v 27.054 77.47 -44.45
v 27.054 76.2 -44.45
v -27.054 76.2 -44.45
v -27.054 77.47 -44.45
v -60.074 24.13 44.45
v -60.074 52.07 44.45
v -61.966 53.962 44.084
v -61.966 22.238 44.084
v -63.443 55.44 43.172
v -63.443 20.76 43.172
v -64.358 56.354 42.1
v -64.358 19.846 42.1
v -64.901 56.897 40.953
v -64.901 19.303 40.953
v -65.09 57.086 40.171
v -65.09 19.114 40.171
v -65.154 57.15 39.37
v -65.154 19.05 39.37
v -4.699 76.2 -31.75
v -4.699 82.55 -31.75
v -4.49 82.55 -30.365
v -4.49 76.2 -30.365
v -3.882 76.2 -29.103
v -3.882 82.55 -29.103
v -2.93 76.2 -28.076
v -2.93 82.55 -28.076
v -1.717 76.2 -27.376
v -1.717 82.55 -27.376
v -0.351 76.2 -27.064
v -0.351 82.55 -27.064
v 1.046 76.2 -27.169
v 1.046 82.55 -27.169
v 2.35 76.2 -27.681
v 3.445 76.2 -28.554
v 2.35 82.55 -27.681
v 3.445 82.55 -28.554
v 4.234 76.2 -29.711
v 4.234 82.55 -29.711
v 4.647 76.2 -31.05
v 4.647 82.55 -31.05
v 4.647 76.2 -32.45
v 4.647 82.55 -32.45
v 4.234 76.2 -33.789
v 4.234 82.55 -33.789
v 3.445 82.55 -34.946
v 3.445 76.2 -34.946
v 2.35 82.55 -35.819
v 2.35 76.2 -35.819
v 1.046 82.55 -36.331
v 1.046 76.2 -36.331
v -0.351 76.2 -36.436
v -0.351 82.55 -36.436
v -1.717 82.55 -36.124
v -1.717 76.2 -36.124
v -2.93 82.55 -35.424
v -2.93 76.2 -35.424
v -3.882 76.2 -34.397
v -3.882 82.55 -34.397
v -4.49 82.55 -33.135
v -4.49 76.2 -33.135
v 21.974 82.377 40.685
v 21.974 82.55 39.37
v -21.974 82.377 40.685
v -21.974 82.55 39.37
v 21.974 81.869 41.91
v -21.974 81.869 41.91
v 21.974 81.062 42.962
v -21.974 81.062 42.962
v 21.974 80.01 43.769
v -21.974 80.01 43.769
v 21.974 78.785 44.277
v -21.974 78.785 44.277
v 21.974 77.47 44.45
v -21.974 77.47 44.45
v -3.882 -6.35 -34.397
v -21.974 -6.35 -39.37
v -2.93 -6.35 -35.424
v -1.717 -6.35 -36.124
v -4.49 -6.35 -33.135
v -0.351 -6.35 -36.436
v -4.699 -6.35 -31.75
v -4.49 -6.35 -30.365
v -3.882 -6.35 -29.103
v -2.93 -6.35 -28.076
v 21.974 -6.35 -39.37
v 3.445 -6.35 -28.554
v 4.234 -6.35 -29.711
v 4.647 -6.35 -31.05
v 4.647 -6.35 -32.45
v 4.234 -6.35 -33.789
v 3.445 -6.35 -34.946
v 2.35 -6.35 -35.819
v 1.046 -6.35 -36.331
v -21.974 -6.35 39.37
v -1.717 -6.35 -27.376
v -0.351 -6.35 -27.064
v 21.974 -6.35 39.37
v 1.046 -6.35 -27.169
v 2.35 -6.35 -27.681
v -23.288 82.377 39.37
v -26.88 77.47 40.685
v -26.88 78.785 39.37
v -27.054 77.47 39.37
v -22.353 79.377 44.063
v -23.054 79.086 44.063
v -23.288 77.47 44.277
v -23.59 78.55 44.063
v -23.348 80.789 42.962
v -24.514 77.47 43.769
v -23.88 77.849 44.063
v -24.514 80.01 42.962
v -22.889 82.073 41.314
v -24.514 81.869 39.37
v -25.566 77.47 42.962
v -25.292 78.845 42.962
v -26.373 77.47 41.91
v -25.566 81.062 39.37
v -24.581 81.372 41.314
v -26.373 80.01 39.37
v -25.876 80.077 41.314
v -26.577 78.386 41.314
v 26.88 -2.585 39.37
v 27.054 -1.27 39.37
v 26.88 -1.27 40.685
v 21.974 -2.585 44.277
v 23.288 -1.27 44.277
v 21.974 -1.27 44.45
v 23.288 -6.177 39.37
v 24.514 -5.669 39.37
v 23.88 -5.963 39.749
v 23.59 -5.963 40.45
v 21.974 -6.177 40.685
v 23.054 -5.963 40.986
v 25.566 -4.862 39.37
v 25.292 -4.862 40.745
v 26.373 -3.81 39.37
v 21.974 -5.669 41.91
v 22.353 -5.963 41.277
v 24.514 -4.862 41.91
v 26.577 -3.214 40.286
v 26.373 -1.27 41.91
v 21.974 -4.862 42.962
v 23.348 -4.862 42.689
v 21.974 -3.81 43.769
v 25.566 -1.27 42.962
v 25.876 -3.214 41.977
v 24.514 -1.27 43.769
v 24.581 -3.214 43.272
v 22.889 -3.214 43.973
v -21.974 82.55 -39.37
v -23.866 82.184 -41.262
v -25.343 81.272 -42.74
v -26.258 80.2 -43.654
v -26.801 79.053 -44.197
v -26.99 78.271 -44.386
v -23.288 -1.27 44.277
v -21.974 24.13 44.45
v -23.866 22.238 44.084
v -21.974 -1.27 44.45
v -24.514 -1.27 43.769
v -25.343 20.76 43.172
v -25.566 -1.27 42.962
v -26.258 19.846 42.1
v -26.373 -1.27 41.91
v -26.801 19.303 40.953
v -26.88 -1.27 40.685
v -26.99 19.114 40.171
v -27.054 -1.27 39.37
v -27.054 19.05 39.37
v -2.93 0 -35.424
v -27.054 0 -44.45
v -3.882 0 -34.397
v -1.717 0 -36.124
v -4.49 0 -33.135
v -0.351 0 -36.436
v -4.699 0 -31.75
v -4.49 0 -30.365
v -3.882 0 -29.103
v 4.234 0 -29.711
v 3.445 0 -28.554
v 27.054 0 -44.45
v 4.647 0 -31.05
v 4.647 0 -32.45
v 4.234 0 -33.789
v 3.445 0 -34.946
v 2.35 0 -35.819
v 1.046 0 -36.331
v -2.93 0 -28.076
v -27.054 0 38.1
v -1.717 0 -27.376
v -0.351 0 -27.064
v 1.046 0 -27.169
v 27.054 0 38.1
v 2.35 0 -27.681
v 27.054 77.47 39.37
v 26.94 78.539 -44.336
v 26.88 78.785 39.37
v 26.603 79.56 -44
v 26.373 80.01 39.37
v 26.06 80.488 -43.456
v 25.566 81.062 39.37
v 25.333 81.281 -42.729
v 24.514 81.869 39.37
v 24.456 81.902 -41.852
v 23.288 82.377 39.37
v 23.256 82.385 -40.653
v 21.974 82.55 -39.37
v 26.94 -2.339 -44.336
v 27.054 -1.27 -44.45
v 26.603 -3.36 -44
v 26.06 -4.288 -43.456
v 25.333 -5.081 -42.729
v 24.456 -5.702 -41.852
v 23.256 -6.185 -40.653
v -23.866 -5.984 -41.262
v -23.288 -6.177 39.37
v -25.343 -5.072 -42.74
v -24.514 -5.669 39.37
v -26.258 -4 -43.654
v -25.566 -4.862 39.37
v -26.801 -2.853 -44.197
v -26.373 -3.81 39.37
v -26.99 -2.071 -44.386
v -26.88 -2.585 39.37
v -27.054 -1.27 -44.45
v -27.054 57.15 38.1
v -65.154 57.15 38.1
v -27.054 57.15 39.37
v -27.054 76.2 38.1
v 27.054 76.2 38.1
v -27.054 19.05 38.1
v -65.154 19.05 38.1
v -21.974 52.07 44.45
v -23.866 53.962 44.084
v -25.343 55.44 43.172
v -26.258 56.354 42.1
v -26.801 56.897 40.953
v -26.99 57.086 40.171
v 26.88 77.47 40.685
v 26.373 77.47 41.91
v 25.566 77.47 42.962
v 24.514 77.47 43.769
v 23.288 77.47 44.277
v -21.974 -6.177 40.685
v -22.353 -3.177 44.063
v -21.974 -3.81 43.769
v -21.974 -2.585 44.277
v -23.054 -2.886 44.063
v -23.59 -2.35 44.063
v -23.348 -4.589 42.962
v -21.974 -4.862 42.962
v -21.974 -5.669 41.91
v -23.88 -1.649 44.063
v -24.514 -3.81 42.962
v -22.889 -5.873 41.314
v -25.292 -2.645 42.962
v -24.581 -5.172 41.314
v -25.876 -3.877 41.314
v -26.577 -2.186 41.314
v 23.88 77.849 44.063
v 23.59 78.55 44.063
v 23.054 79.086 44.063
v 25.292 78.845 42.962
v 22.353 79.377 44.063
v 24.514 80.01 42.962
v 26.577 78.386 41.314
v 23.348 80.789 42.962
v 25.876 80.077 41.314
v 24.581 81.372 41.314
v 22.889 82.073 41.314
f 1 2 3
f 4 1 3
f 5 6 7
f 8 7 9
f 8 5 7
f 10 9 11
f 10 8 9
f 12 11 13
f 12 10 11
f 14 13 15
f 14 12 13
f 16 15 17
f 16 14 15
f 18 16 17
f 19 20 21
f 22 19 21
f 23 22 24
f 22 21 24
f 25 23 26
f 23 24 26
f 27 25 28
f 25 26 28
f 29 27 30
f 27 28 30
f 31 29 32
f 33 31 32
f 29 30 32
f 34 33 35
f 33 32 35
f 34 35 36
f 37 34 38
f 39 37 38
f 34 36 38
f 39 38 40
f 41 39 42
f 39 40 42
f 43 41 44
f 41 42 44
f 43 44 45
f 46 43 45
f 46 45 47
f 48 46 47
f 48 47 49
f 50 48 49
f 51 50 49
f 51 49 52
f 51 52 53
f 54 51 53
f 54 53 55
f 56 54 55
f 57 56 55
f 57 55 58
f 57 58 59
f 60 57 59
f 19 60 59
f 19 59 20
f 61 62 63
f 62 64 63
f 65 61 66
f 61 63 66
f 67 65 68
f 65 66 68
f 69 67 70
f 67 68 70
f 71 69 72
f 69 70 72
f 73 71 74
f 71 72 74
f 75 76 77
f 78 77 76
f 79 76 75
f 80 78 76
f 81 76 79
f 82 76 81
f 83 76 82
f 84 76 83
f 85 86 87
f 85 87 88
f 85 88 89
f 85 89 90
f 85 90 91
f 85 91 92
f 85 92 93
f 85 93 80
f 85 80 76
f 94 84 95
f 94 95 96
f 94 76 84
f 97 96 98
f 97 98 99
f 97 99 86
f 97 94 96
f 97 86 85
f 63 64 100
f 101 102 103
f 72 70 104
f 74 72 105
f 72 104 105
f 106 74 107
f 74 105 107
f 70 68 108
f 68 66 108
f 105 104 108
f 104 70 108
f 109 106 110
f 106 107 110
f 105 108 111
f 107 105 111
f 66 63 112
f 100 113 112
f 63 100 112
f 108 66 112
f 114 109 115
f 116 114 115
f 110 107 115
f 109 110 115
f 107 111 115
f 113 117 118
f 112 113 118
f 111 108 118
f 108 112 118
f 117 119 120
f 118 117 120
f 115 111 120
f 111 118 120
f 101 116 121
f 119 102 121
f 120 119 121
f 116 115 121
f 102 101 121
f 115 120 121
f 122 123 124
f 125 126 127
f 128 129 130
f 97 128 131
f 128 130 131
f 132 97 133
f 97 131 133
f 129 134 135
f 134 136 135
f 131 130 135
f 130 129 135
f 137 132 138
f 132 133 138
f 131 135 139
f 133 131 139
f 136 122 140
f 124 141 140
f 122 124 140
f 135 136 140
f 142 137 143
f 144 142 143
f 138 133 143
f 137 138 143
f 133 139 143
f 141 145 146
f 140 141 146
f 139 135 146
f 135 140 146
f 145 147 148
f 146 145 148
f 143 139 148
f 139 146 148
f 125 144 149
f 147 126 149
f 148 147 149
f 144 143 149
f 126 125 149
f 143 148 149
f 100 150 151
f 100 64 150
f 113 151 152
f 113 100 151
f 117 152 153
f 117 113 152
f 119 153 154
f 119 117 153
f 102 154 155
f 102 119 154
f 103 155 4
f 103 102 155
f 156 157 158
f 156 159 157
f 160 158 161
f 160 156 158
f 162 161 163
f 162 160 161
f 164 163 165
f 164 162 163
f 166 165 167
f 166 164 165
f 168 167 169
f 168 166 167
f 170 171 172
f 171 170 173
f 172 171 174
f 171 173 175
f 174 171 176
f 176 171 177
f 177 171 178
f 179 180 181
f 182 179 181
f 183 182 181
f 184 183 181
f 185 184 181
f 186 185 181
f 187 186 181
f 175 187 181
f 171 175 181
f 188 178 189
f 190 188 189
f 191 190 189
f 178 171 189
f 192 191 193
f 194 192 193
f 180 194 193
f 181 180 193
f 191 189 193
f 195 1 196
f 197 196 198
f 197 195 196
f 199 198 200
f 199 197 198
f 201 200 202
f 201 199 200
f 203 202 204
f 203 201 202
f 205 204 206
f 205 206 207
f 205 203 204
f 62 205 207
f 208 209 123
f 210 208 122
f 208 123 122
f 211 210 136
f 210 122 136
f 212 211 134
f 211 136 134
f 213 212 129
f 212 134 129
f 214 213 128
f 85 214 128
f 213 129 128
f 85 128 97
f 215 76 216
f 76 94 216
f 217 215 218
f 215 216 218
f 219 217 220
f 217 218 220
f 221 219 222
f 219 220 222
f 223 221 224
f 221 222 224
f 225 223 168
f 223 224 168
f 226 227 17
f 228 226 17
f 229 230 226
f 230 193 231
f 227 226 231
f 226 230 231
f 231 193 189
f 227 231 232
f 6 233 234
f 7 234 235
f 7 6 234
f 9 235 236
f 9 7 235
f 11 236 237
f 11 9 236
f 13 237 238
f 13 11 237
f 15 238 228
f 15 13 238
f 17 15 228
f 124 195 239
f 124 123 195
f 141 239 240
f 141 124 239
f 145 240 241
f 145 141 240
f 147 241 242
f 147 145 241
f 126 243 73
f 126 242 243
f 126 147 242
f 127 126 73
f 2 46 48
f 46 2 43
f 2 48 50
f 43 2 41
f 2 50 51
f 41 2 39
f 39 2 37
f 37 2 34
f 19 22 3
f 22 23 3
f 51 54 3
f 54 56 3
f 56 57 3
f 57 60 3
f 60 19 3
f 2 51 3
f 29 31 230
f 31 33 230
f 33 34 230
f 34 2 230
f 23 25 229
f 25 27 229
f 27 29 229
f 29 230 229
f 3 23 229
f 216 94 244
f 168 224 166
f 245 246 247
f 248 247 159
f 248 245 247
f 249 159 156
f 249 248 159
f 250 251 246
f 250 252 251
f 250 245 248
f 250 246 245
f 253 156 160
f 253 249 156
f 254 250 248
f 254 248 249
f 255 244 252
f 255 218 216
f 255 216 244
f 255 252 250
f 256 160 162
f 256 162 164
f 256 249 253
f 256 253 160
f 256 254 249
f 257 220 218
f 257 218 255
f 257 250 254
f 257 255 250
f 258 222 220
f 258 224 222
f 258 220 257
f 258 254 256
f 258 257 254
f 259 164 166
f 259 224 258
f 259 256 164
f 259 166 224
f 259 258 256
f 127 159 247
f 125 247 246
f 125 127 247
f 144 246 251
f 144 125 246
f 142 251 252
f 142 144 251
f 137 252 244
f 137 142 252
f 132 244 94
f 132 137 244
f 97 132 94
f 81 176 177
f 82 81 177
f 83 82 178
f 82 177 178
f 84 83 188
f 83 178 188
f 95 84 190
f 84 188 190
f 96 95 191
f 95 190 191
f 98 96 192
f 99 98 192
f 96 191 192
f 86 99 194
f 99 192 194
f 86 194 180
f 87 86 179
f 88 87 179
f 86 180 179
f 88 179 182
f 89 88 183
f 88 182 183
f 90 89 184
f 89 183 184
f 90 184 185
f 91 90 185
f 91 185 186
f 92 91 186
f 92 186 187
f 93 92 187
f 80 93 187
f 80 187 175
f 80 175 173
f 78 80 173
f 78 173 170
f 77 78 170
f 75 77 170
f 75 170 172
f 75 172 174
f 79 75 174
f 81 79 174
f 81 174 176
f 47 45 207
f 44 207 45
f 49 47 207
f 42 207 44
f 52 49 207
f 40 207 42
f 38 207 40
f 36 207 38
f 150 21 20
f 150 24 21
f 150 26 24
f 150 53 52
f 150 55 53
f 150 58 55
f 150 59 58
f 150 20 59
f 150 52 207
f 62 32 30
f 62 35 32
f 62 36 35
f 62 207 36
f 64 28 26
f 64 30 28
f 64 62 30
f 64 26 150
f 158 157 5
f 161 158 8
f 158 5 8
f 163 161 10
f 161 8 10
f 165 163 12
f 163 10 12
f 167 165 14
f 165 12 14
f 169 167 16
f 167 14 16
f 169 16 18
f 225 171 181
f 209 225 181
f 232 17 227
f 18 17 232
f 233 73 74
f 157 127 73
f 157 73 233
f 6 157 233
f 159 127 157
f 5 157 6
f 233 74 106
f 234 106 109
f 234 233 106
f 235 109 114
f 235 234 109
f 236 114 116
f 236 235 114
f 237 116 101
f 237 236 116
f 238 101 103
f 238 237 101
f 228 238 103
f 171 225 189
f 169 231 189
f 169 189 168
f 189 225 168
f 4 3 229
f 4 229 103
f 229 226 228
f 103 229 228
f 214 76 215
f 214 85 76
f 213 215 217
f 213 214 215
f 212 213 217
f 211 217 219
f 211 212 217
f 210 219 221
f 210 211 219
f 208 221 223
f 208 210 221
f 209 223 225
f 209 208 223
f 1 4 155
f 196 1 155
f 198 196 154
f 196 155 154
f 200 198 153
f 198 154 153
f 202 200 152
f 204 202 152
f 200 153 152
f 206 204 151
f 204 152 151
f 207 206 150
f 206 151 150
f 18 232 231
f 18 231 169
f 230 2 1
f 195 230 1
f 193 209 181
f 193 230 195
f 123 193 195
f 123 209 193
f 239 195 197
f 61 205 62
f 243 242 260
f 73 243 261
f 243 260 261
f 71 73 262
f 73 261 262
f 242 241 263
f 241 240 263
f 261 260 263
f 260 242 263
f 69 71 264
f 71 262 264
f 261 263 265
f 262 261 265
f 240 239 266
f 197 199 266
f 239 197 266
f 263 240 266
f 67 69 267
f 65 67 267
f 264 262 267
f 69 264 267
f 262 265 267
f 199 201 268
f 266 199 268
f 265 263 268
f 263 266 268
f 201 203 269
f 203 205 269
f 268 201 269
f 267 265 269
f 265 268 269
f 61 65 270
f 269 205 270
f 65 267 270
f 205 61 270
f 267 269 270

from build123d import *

# Parameters (mm, degrees)
F0_W     = 54.107094341
F0_H     = 88.9
F1_DEPTH = 6.35
F2_W     = 54.107094341
F2_H     = 6.35
F3_DEPTH = 76.2
F4_W     = 54.107094341
F4_H     = 88.9
F5_DEPTH = 6.35
F6_R     = 4.699
F7_DEPTH = 109.22
F8_W     = 38.1
F8_H     = 6.35
F9_DEPTH = 38.1
F10_R    = 5.08


with BuildPart() as f1:
    # F0 (on Front) → F1 (new body)
    with BuildSketch(Plane.XZ):
        Rectangle(F0_W, F0_H)
    extrude(amount=F1_DEPTH)

    # F2 (on face) → F3 (join)
    with BuildSketch(Plane(origin=(0, 0, 0), x_dir=(-1, 0, 0), z_dir=(0, 1, 0))):
        with Locations((0, 41.275)):
            Rectangle(F2_W, F2_H)
    extrude(amount=F3_DEPTH)

    # F4 (on face) → F5 (join)
    with BuildSketch(Plane(origin=(0, 76.2, 0), x_dir=(-1, 0, 0), z_dir=(0, 1, 0))):
        Rectangle(F4_W, F4_H)
    extrude(amount=F5_DEPTH)

    # F6 (on face) → F7 (cut)
    with BuildSketch(Plane(origin=(0, 82.55, 0), x_dir=(-1, 0, 0), z_dir=(0, 1, 0))):
        with Locations((0, -31.75)):
            Circle(F6_R)
    extrude(amount=-F7_DEPTH, mode=Mode.SUBTRACT)

    # F8 (on face) → F9 (join)
    with BuildSketch(Plane(origin=(-27.0535471705, 0, 0), x_dir=(0, -1, 0), z_dir=(-1, 0, 0))):
        with Locations((-38.1, 41.275)):
            Rectangle(F8_W, F8_H)
    extrude(amount=F9_DEPTH)

    # F10
    f10_edges = [f1.edges().sort_by_distance(p)[0] for p in [
        (27.053547, 82.55, 0),
        (27.053547, 38.1, 44.45),
        (-27.053547, 82.55, 0),
        (-27.053547, -6.35, 0),
        (27.053547, -6.35, 0),
        (0, -6.35, -44.45),
        (0, 82.55, -44.45),
        (0, -6.35, 44.45),
        (0, 82.55, 44.45),
        (-27.053547, 69.85, 44.45),
        (-27.053547, 6.35, 44.45),
        (-65.153547, 38.1, 44.45),
        (-46.103547, 19.05, 44.45),
        (-46.103547, 57.15, 44.45),
    ]]
    fillet(f10_edges, radius=F10_R)


solid = f1.part
